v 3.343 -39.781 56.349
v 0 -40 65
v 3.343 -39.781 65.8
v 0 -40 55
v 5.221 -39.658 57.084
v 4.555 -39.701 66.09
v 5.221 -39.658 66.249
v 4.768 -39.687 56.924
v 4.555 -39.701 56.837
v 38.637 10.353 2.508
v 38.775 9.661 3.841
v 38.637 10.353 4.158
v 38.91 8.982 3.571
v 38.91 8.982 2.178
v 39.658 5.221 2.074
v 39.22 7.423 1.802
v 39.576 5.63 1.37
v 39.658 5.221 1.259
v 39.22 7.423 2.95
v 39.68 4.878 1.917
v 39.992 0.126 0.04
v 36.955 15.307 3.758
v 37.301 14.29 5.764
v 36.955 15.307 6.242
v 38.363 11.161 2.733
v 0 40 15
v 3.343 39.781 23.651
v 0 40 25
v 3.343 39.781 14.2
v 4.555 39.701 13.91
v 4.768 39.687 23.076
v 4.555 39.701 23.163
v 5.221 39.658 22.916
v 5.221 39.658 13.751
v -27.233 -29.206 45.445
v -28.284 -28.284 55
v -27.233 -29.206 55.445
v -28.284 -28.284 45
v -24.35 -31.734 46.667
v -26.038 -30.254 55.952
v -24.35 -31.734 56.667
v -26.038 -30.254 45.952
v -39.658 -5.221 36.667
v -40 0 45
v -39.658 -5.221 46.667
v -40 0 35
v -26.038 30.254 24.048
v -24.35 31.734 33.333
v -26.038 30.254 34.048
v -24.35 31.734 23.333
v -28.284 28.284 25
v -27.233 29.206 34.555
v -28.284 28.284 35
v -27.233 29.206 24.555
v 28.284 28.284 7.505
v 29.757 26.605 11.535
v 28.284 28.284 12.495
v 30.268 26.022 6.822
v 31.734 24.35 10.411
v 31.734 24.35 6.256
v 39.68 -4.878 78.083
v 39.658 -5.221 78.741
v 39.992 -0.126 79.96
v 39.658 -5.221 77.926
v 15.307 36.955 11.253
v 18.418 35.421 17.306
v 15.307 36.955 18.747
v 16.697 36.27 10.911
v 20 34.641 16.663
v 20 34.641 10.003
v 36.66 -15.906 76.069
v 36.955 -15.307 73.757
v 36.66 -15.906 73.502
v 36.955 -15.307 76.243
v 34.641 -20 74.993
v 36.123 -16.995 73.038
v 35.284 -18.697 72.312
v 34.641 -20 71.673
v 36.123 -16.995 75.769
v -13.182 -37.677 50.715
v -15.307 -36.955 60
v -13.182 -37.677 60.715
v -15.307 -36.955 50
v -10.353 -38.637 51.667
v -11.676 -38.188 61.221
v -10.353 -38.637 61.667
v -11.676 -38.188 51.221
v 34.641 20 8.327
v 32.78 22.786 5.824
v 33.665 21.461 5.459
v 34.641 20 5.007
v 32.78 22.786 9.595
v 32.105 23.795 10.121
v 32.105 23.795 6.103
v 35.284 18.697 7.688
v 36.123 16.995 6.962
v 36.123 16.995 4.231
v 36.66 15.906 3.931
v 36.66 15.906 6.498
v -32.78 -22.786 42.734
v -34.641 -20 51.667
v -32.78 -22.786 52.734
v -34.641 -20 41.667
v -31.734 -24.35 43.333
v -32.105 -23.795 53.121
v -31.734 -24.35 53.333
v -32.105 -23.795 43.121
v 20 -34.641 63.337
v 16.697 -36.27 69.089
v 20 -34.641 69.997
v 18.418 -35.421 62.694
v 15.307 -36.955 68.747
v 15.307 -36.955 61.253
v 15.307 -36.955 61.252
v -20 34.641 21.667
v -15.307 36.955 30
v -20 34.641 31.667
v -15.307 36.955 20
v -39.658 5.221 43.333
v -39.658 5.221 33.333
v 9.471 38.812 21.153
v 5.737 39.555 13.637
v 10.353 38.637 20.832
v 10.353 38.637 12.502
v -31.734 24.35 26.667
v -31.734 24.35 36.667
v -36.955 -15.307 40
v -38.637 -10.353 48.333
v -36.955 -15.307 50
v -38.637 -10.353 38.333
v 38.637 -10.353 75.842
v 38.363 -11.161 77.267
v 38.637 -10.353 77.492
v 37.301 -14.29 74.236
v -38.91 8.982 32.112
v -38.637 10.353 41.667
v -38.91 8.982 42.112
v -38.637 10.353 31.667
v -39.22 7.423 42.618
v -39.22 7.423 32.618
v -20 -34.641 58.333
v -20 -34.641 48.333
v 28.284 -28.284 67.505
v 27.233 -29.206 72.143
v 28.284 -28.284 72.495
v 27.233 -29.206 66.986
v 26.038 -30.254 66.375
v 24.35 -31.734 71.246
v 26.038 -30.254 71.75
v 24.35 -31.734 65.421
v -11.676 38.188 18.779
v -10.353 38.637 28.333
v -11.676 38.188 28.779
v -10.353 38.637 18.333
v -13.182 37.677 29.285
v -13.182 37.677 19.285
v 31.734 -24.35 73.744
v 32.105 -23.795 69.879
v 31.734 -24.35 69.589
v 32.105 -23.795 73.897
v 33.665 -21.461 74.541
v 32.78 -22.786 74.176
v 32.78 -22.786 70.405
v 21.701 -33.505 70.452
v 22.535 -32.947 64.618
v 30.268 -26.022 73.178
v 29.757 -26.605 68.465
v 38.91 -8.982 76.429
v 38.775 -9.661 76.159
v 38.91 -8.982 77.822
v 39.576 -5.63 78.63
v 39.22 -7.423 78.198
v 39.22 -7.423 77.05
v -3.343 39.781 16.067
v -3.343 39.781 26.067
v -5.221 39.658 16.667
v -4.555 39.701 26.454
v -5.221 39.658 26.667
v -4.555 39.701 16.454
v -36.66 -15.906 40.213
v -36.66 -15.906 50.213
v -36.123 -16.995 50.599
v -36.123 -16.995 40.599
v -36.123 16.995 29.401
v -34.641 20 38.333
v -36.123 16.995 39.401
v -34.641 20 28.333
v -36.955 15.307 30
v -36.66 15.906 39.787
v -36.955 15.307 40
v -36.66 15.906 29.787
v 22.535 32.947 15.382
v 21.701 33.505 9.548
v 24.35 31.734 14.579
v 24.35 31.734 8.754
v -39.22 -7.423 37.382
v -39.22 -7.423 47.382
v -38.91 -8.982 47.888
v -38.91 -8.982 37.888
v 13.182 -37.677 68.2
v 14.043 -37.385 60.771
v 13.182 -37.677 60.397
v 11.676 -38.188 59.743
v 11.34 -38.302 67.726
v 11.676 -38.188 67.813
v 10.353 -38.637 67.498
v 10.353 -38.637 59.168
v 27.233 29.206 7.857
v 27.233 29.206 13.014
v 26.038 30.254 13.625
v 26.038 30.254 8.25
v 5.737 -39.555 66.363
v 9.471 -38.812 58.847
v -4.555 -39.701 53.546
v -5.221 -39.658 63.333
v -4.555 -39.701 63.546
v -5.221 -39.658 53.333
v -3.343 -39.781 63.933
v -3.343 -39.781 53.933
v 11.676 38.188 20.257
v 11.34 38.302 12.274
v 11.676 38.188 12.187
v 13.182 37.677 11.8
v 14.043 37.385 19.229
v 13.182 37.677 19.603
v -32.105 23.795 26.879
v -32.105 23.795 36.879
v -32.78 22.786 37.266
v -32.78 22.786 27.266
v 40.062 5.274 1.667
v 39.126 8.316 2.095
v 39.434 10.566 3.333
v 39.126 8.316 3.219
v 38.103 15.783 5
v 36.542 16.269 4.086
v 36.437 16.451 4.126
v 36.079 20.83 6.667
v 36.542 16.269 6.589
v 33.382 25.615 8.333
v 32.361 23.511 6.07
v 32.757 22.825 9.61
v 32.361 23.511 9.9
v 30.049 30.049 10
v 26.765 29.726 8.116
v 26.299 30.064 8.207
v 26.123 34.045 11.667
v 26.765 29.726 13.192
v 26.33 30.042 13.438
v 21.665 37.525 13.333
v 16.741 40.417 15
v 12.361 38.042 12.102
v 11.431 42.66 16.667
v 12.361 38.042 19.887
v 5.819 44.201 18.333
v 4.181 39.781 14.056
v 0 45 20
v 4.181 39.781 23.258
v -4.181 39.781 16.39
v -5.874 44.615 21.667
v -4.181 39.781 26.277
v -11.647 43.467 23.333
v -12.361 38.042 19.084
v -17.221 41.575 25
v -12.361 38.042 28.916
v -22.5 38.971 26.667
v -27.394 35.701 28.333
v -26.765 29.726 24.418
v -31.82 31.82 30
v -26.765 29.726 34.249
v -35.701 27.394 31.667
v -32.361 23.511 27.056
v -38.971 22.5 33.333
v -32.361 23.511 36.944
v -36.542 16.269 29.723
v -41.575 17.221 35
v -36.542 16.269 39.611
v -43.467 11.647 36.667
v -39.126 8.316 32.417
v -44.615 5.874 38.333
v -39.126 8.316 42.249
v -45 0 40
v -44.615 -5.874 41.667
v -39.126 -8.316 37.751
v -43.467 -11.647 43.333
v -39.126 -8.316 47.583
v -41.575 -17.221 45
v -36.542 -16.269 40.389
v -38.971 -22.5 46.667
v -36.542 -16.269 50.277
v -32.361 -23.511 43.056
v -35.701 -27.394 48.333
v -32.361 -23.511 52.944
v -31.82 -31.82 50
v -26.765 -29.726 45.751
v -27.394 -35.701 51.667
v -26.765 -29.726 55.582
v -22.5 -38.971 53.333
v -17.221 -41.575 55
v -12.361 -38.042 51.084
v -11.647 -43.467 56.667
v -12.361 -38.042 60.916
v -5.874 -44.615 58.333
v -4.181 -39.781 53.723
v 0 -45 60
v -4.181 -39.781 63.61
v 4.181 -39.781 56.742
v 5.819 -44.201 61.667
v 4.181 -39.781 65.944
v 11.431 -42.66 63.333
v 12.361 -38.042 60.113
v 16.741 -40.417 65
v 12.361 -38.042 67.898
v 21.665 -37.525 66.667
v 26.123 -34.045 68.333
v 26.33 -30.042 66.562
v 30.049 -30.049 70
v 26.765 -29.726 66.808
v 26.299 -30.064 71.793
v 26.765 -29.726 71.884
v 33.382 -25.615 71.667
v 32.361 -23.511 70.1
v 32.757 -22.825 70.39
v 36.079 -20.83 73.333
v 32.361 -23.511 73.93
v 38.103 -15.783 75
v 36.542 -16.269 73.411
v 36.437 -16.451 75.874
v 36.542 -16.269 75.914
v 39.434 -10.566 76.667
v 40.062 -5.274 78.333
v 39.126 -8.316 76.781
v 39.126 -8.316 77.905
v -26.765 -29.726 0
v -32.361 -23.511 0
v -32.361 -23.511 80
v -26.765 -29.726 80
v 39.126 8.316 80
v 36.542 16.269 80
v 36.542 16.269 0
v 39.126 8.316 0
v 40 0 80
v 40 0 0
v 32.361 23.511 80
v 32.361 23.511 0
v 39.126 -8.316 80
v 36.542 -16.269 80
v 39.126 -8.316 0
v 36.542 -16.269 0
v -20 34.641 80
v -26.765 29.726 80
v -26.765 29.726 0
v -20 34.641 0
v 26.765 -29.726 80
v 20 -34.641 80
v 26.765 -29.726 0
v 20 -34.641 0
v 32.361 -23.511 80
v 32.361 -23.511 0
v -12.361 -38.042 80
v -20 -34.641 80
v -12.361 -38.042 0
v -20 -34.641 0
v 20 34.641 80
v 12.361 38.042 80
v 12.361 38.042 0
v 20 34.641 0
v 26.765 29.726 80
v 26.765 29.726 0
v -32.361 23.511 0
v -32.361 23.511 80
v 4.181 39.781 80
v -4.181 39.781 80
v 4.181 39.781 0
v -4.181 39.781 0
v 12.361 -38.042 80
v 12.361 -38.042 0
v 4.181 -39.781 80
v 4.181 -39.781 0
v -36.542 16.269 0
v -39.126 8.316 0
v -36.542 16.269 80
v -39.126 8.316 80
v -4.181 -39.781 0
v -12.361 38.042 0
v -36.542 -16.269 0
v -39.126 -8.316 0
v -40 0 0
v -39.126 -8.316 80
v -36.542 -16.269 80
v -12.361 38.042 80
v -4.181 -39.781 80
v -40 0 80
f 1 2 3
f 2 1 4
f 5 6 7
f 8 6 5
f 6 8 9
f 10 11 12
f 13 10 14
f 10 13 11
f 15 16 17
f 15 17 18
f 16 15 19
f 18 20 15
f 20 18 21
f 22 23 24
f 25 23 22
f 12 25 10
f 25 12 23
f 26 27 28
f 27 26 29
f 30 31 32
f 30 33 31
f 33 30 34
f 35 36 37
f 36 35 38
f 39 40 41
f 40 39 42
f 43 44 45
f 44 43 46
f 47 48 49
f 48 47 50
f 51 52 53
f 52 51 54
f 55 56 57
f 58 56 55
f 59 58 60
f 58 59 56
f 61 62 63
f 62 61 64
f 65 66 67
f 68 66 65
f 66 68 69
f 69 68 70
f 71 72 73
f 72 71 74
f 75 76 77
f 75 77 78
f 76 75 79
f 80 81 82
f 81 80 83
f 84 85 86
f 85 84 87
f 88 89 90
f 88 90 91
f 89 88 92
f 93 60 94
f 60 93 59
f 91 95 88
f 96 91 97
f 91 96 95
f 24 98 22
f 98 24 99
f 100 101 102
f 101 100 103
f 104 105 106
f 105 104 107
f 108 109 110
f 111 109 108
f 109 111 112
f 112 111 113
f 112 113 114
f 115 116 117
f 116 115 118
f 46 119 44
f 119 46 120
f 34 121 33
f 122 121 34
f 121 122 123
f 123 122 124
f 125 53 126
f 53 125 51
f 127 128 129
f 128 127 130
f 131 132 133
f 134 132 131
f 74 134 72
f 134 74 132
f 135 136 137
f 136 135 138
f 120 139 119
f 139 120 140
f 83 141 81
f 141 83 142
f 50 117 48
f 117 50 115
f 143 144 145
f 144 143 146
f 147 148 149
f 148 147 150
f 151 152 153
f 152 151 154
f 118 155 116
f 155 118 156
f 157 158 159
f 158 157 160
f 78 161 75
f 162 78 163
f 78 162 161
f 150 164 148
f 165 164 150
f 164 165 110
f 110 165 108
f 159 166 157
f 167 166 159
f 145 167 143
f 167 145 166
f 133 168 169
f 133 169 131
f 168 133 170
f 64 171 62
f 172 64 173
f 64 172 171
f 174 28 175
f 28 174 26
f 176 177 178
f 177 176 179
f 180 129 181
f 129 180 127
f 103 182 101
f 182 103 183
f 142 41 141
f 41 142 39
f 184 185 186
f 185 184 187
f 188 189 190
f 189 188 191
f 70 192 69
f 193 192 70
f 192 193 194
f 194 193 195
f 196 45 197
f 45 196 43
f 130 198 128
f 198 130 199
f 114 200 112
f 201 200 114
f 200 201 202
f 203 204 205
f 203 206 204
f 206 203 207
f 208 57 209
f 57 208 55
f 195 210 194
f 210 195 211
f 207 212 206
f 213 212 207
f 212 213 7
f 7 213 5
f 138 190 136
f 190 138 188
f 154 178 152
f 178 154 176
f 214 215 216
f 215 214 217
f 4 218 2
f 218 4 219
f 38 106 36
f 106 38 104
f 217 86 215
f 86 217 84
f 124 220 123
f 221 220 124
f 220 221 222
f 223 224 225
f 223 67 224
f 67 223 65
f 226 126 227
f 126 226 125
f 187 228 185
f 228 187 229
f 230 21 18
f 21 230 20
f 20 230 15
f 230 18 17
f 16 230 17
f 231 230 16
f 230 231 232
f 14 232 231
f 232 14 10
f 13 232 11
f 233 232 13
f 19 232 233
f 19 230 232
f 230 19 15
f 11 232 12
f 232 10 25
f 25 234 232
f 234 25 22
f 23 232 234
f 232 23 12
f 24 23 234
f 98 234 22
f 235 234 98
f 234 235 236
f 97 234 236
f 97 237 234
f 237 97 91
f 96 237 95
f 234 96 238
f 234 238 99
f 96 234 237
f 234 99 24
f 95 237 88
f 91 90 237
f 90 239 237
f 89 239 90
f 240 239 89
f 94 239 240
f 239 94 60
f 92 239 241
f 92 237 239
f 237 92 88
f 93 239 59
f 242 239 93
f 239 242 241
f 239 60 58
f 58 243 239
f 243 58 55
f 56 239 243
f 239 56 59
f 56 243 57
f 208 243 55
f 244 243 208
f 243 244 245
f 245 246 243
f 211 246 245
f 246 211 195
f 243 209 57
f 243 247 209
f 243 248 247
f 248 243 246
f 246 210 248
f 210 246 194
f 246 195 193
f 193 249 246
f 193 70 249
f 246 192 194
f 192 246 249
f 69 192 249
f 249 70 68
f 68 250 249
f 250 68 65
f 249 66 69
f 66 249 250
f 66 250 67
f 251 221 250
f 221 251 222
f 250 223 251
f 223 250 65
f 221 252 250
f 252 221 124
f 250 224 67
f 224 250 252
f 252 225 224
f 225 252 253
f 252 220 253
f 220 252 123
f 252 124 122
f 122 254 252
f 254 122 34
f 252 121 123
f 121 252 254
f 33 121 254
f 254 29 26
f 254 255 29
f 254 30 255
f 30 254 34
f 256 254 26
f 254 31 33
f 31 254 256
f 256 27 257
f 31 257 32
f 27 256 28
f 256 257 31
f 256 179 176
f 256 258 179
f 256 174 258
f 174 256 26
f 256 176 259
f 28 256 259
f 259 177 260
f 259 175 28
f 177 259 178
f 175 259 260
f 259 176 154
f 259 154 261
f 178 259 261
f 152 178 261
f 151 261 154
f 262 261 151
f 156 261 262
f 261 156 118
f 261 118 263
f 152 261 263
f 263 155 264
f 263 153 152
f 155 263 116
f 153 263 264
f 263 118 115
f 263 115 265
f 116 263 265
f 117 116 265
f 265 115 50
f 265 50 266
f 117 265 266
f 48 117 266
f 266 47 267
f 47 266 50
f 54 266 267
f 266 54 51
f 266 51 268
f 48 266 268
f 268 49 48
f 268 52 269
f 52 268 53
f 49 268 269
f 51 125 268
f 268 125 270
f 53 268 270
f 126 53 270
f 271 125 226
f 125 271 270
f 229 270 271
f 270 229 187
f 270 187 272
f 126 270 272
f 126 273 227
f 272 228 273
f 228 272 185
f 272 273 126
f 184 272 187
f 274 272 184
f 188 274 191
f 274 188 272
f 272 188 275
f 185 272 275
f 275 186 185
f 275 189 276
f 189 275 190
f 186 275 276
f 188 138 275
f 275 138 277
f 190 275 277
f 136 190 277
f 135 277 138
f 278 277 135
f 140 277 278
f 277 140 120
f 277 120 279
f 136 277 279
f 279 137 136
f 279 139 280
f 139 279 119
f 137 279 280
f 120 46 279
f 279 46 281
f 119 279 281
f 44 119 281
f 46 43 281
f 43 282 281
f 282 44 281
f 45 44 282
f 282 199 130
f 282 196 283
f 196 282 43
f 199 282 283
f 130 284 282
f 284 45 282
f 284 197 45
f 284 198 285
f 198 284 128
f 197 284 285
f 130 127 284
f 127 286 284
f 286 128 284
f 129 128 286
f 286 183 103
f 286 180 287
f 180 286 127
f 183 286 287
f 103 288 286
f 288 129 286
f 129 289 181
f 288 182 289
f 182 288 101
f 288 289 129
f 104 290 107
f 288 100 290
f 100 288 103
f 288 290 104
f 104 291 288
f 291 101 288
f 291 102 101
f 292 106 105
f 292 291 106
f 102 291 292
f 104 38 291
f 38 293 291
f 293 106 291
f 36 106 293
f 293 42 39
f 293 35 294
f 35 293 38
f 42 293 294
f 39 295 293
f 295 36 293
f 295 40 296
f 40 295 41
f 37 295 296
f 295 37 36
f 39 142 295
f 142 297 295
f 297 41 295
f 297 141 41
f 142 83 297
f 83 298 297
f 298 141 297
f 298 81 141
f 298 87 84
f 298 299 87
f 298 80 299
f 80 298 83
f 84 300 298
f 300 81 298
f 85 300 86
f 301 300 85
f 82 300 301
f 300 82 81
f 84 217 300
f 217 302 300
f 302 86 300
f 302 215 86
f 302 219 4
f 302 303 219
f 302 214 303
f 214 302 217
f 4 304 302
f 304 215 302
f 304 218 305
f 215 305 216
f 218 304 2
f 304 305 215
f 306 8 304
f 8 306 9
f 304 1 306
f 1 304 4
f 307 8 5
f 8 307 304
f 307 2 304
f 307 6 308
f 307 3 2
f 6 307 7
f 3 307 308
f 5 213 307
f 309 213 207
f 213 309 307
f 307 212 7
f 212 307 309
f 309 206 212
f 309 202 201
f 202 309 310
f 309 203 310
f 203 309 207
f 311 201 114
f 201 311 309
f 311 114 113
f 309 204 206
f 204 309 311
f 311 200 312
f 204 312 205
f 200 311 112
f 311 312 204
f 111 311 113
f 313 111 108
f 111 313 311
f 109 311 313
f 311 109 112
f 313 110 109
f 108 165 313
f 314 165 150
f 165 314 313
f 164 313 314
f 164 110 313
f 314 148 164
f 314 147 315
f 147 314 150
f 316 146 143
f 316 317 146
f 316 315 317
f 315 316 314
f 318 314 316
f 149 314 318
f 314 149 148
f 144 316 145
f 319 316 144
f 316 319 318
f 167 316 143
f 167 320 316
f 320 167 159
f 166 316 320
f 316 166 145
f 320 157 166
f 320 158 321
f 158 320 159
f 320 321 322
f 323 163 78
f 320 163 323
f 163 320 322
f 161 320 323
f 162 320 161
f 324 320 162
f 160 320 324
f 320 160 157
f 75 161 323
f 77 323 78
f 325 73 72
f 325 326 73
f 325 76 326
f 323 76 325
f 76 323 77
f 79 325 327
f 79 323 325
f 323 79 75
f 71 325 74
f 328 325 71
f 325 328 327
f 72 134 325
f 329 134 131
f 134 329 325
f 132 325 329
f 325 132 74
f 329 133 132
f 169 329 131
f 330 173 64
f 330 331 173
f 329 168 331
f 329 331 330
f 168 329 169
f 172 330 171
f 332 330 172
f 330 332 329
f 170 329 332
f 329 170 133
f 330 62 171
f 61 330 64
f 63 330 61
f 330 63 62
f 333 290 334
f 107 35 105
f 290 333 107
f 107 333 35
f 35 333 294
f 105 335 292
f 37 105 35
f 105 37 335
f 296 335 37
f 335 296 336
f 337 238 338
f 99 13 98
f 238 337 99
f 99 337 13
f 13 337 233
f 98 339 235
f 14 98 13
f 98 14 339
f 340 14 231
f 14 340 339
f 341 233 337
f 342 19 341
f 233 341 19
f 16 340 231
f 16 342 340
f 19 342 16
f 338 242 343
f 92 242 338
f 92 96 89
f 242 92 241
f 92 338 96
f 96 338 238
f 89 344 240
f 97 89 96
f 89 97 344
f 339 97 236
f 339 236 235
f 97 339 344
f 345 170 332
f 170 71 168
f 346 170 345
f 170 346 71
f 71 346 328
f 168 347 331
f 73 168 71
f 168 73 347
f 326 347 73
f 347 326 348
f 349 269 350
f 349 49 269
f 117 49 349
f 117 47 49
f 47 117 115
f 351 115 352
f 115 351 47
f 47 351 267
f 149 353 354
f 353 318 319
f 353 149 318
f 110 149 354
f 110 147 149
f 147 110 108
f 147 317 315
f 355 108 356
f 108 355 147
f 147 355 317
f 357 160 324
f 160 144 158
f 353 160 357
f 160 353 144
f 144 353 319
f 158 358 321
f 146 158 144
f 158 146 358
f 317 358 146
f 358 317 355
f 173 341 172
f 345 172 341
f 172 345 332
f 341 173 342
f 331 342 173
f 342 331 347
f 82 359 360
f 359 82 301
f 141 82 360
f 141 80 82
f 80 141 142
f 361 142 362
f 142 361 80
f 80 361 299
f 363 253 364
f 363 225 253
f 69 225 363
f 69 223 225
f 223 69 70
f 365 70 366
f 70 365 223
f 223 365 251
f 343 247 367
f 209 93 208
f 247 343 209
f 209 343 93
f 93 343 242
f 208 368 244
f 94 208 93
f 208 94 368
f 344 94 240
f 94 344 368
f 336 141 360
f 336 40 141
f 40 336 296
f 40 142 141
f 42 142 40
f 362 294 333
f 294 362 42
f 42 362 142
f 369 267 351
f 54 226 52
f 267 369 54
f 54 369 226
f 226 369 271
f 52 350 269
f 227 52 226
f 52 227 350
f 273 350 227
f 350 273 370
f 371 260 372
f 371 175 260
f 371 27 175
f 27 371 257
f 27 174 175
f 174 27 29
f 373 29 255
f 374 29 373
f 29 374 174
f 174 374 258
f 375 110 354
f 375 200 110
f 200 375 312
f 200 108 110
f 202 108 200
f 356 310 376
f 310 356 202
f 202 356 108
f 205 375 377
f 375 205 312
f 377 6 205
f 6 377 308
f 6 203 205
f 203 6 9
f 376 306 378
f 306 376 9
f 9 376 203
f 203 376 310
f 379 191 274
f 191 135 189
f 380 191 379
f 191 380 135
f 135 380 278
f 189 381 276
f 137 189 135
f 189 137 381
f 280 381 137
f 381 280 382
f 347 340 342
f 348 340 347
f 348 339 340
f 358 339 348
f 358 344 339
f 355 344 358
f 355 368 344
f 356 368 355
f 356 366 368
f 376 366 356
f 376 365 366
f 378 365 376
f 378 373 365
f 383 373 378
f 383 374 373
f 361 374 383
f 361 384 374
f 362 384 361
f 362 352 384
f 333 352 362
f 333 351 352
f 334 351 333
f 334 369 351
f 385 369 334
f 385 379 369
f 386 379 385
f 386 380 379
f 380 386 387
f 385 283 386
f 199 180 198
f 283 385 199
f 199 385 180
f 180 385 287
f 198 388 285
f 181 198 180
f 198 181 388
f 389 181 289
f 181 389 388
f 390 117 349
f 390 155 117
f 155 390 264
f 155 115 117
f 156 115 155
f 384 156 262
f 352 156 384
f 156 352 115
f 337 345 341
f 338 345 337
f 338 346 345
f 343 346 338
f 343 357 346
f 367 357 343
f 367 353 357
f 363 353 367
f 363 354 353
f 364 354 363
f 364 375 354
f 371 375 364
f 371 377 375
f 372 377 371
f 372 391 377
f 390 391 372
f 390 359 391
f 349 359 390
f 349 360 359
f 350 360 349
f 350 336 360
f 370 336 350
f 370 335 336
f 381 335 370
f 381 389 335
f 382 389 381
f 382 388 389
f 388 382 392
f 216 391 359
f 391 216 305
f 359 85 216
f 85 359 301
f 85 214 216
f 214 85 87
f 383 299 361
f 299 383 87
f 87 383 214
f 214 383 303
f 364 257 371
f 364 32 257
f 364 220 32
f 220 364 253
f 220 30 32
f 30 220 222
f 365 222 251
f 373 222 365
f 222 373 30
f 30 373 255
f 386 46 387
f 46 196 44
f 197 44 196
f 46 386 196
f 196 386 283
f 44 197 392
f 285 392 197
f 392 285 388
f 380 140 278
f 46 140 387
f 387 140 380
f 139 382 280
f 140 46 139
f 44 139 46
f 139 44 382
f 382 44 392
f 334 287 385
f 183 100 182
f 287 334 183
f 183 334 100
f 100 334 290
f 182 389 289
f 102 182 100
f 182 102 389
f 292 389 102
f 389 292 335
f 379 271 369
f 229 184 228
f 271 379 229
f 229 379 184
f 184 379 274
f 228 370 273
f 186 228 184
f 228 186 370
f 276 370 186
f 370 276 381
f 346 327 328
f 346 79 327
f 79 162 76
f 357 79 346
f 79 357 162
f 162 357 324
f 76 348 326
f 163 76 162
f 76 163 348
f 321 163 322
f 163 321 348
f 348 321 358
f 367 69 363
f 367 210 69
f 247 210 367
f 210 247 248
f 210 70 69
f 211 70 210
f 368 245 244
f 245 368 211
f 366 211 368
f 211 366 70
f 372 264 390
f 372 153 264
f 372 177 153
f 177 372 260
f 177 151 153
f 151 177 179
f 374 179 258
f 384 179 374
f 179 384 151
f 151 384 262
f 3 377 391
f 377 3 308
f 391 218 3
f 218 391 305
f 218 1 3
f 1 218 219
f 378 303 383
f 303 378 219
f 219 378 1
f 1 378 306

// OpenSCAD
// Generated by SolidPython 1.0.5 on 2021-06-01 16:29:01


union() {
	intersection() {
		polyhedron(convexity = 2, faces = [[0, 1, 3], [1, 4, 3], [1, 2, 4], [2, 5, 4], [0, 5, 2], [0, 3, 5], [3, 4, 6], [4, 7, 6], [4, 5, 7], [5, 8, 7], [3, 8, 5], [3, 6, 8], [6, 7, 9], [7, 10, 9], [7, 8, 10], [8, 11, 10], [6, 11, 8], [6, 9, 11], [9, 10, 12], [10, 13, 12], [10, 11, 13], [11, 14, 13], [9, 14, 11], [9, 12, 14], [12, 13, 15], [13, 16, 15], [13, 14, 16], [14, 17, 16], [12, 17, 14], [12, 15, 17], [15, 16, 18], [16, 19, 18], [16, 17, 19], [17, 20, 19], [15, 20, 17], [15, 18, 20], [18, 19, 21], [19, 22, 21], [19, 20, 22], [20, 23, 22], [18, 23, 20], [18, 21, 23], [21, 22, 24], [22, 25, 24], [22, 23, 25], [23, 26, 25], [21, 26, 23], [21, 24, 26], [24, 25, 27], [25, 28, 27], [25, 26, 28], [26, 29, 28], [24, 29, 26], [24, 27, 29], [27, 28, 30], [28, 31, 30], [28, 29, 31], [29, 32, 31], [27, 32, 29], [27, 30, 32], [30, 31, 33], [31, 34, 33], [31, 32, 34], [32, 35, 34], [30, 35, 32], [30, 33, 35], [33, 34, 36], [34, 37, 36], [34, 35, 37], [35, 38, 37], [33, 38, 35], [33, 36, 38], [36, 37, 39], [37, 40, 39], [37, 38, 40], [38, 41, 40], [36, 41, 38], [36, 39, 41], [39, 40, 42], [40, 43, 42], [40, 41, 43], [41, 44, 43], [39, 44, 41], [39, 42, 44], [42, 43, 45], [43, 46, 45], [43, 44, 46], [44, 47, 46], [42, 47, 44], [42, 45, 47], [45, 46, 48], [46, 49, 48], [46, 47, 49], [47, 50, 49], [45, 50, 47], [45, 48, 50], [48, 49, 51], [49, 52, 51], [49, 50, 52], [50, 53, 52], [48, 53, 50], [48, 51, 53], [51, 52, 54], [52, 55, 54], [52, 53, 55], [53, 56, 55], [51, 56, 53], [51, 54, 56], [54, 55, 57], [55, 58, 57], [55, 56, 58], [56, 59, 58], [54, 59, 56], [54, 57, 59], [57, 58, 60], [58, 61, 60], [58, 59, 61], [59, 62, 61], [57, 62, 59], [57, 60, 62], [60, 61, 63], [61, 64, 63], [61, 62, 64], [62, 65, 64], [60, 65, 62], [60, 63, 65], [63, 64, 66], [64, 67, 66], [64, 65, 67], [65, 68, 67], [63, 68, 65], [63, 66, 68], [66, 67, 69], [67, 70, 69], [67, 68, 70], [68, 71, 70], [66, 71, 68], [66, 69, 71], [69, 70, 72], [70, 73, 72], [70, 71, 73], [71, 74, 73], [69, 74, 71], [69, 72, 74], [72, 73, 75], [73, 76, 75], [73, 74, 76], [74, 77, 76], [72, 77, 74], [72, 75, 77], [75, 76, 78], [76, 79, 78], [76, 77, 79], [77, 80, 79], [75, 80, 77], [75, 78, 80], [78, 79, 81], [79, 82, 81], [79, 80, 82], [80, 83, 82], [78, 83, 80], [78, 81, 83], [81, 82, 84], [82, 85, 84], [82, 83, 85], [83, 86, 85], [81, 86, 83], [81, 84, 86], [84, 85, 87], [85, 88, 87], [85, 86, 88], [86, 89, 88], [84, 89, 86], [84, 87, 89], [87, 88, 90], [88, 91, 90], [88, 89, 91], [89, 92, 91], [87, 92, 89], [87, 90, 92], [90, 91, 93], [91, 94, 93], [91, 92, 94], [92, 95, 94], [90, 95, 92], [90, 93, 95], [93, 94, 96], [94, 97, 96], [94, 95, 97], [95, 98, 97], [93, 98, 95], [93, 96, 98], [96, 97, 99], [97, 100, 99], [97, 98, 100], [98, 101, 100], [96, 101, 98], [96, 99, 101], [99, 100, 102], [100, 103, 102], [100, 101, 103], [101, 104, 103], [99, 104, 101], [99, 102, 104], [102, 103, 105], [103, 106, 105], [103, 104, 106], [104, 107, 106], [102, 107, 104], [102, 105, 107], [105, 106, 108], [106, 109, 108], [106, 107, 109], [107, 110, 109], [105, 110, 107], [105, 108, 110], [108, 109, 111], [109, 112, 111], [109, 110, 112], [110, 113, 112], [108, 113, 110], [108, 111, 113], [111, 112, 114], [112, 115, 114], [112, 113, 115], [113, 116, 115], [111, 116, 113], [111, 114, 116], [114, 115, 117], [115, 118, 117], [115, 116, 118], [116, 119, 118], [114, 119, 116], [114, 117, 119], [117, 118, 120], [118, 121, 120], [118, 119, 121], [119, 122, 121], [117, 122, 119], [117, 120, 122], [120, 121, 123], [121, 124, 123], [121, 122, 124], [122, 125, 124], [120, 125, 122], [120, 123, 125], [123, 124, 126], [124, 127, 126], [124, 125, 127], [125, 128, 127], [123, 128, 125], [123, 126, 128], [126, 127, 129], [127, 130, 129], [127, 128, 130], [128, 131, 130], [126, 131, 128], [126, 129, 131], [129, 130, 132], [130, 133, 132], [130, 131, 133], [131, 134, 133], [129, 134, 131], [129, 132, 134], [132, 133, 135], [133, 136, 135], [133, 134, 136], [134, 137, 136], [132, 137, 134], [132, 135, 137], [135, 136, 138], [136, 139, 138], [136, 137, 139], [137, 140, 139], [135, 140, 137], [135, 138, 140], [138, 139, 141], [139, 142, 141], [139, 140, 142], [140, 143, 142], [138, 143, 140], [138, 141, 143], [141, 142, 144], [142, 145, 144], [142, 143, 145], [143, 146, 145], [141, 146, 143], [141, 144, 146], [0, 2, 1], [144, 145, 146]], points = [[34.9900000000, 0.0000000000, -5.0000000000], [39.9900000000, 0.0000000000, 0.0000000000], [34.9900000000, 0.0000000000, 5.0000000000], [35.1045839291, 4.6216061510, -3.3333333333], [40.0618082360, 5.2742371121, 1.6666666667], [35.1045839291, 4.6216061510, 6.6666666667], [34.6042927268, 9.2721922908, -1.6666666667], [39.4339218583, 10.5662875163, 3.3333333333], [34.6042927268, 9.2721922908, 8.3333333333], [33.4837039570, 13.8694042975, 0.0000000000], [38.1031016196, 15.7828214593, 5.0000000000], [33.4837039570, 13.8694042975, 10.0000000000], [31.7484913027, 18.3300000000, 1.6666666667], [36.0786183217, 20.8300000000, 6.6666666667], [31.7484913027, 18.3300000000, 11.6666666667], [29.4155584746, 22.5713518841, 3.3333333333], [33.3823251761, 25.6151590291, 8.3333333333], [29.4155584746, 22.5713518841, 13.3333333333], [26.5129687606, 26.5129687606, 5.0000000000], [30.0485026665, 30.0485026665, 10.0000000000], [26.5129687606, 26.5129687606, 15.0000000000], [23.0796676773, 30.0780085138, 6.6666666667], [26.1234748223, 34.0447752152, 11.6666666667], [23.0796676773, 30.0780085138, 16.6666666667], [19.1650000000, 33.1947537271, 8.3333333333], [21.6650000000, 37.5248807460, 13.3333333333], [19.1650000000, 33.1947537271, 18.3333333333], [14.8280262956, 35.7980221860, 10.0000000000], [16.7414434574, 40.4174198485, 15.0000000000], [14.8280262956, 35.7980221860, 20.0000000000], [10.1366479014, 37.8304849866, 11.6666666667], [11.4307431270, 42.6601141181, 16.6666666667], [10.1366479014, 37.8304849866, 21.6666666667], [5.1665530036, 39.2438662253, 13.3333333333], [5.8191839647, 44.2010905322, 18.3333333333], [5.1665530036, 39.2438662253, 23.3333333333], [0.0000000000, 40.0000000000, 15.0000000000], [0.0000000000, 45.0000000000, 20.0000000000], [0.0000000000, 40.0000000000, 25.0000000000], [-5.2210476888, 39.6577944550, 16.6666666667], [-5.8736786499, 44.6150187618, 21.6666666667], [-5.2210476888, 39.6577944550, 26.6666666667], [-10.3527618041, 38.6370330516, 18.3333333333], [-11.6468570296, 43.4666621830, 23.3333333333], [-10.3527618041, 38.6370330516, 28.3333333333], [-15.3073372946, 36.9551813005, 20.0000000000], [-17.2207544564, 41.5745789630, 25.0000000000], [-15.3073372946, 36.9551813005, 30.0000000000], [-20.0000000000, 34.6410161514, 21.6666666667], [-22.5000000000, 38.9711431703, 26.6666666667], [-20.0000000000, 34.6410161514, 31.6666666667], [-24.3504571603, 31.7341336116, 23.3333333333], [-27.3942643054, 35.7009003131, 28.3333333333], [-24.3504571603, 31.7341336116, 33.3333333333], [-28.2842712475, 28.2842712475, 25.0000000000], [-31.8198051534, 31.8198051534, 30.0000000000], [-28.2842712475, 28.2842712475, 35.0000000000], [-31.7341336116, 24.3504571603, 26.6666666667], [-35.7009003131, 27.3942643054, 31.6666666667], [-31.7341336116, 24.3504571603, 36.6666666667], [-34.6410161514, 20.0000000000, 28.3333333333], [-38.9711431703, 22.5000000000, 33.3333333333], [-34.6410161514, 20.0000000000, 38.3333333333], [-36.9551813005, 15.3073372946, 30.0000000000], [-41.5745789630, 17.2207544564, 35.0000000000], [-36.9551813005, 15.3073372946, 40.0000000000], [-38.6370330516, 10.3527618041, 31.6666666667], [-43.4666621830, 11.6468570296, 36.6666666667], [-38.6370330516, 10.3527618041, 41.6666666667], [-39.6577944550, 5.2210476888, 33.3333333333], [-44.6150187618, 5.8736786499, 38.3333333333], [-39.6577944550, 5.2210476888, 43.3333333333], [-40.0000000000, 0.0000000000, 35.0000000000], [-45.0000000000, 0.0000000000, 40.0000000000], [-40.0000000000, 0.0000000000, 45.0000000000], [-39.6577944550, -5.2210476888, 36.6666666667], [-44.6150187618, -5.8736786499, 41.6666666667], [-39.6577944550, -5.2210476888, 46.6666666667], [-38.6370330516, -10.3527618041, 38.3333333333], [-43.4666621830, -11.6468570296, 43.3333333333], [-38.6370330516, -10.3527618041, 48.3333333333], [-36.9551813005, -15.3073372946, 40.0000000000], [-41.5745789630, -17.2207544564, 45.0000000000], [-36.9551813005, -15.3073372946, 50.0000000000], [-34.6410161514, -20.0000000000, 41.6666666667], [-38.9711431703, -22.5000000000, 46.6666666667], [-34.6410161514, -20.0000000000, 51.6666666667], [-31.7341336116, -24.3504571603, 43.3333333333], [-35.7009003131, -27.3942643054, 48.3333333333], [-31.7341336116, -24.3504571603, 53.3333333333], [-28.2842712475, -28.2842712475, 45.0000000000], [-31.8198051534, -31.8198051534, 50.0000000000], [-28.2842712475, -28.2842712475, 55.0000000000], [-24.3504571603, -31.7341336116, 46.6666666667], [-27.3942643054, -35.7009003131, 51.6666666667], [-24.3504571603, -31.7341336116, 56.6666666667], [-20.0000000000, -34.6410161514, 48.3333333333], [-22.5000000000, -38.9711431703, 53.3333333333], [-20.0000000000, -34.6410161514, 58.3333333333], [-15.3073372946, -36.9551813005, 50.0000000000], [-17.2207544564, -41.5745789630, 55.0000000000], [-15.3073372946, -36.9551813005, 60.0000000000], [-10.3527618041, -38.6370330516, 51.6666666667], [-11.6468570296, -43.4666621830, 56.6666666667], [-10.3527618041, -38.6370330516, 61.6666666667], [-5.2210476888, -39.6577944550, 53.3333333333], [-5.8736786499, -44.6150187618, 58.3333333333], [-5.2210476888, -39.6577944550, 63.3333333333], [-0.0000000000, -40.0000000000, 55.0000000000], [-0.0000000000, -45.0000000000, 60.0000000000], [-0.0000000000, -40.0000000000, 65.0000000000], [5.1665530036, -39.2438662253, 56.6666666667], [5.8191839647, -44.2010905322, 61.6666666667], [5.1665530036, -39.2438662253, 66.6666666667], [10.1366479014, -37.8304849866, 58.3333333333], [11.4307431270, -42.6601141181, 63.3333333333], [10.1366479014, -37.8304849866, 68.3333333333], [14.8280262956, -35.7980221860, 60.0000000000], [16.7414434574, -40.4174198485, 65.0000000000], [14.8280262956, -35.7980221860, 70.0000000000], [19.1650000000, -33.1947537271, 61.6666666667], [21.6650000000, -37.5248807460, 66.6666666667], [19.1650000000, -33.1947537271, 71.6666666667], [23.0796676773, -30.0780085138, 63.3333333333], [26.1234748223, -34.0447752152, 68.3333333333], [23.0796676773, -30.0780085138, 73.3333333333], [26.5129687606, -26.5129687606, 65.0000000000], [30.0485026665, -30.0485026665, 70.0000000000], [26.5129687606, -26.5129687606, 75.0000000000], [29.4155584746, -22.5713518841, 66.6666666667], [33.3823251761, -25.6151590291, 71.6666666667], [29.4155584746, -22.5713518841, 76.6666666667], [31.7484913027, -18.3300000000, 68.3333333333], [36.0786183217, -20.8300000000, 73.3333333333], [31.7484913027, -18.3300000000, 78.3333333333], [33.4837039570, -13.8694042975, 70.0000000000], [38.1031016196, -15.7828214593, 75.0000000000], [33.4837039570, -13.8694042975, 80.0000000000], [34.6042927268, -9.2721922908, 71.6666666667], [39.4339218583, -10.5662875163, 76.6666666667], [34.6042927268, -9.2721922908, 81.6666666667], [35.1045839291, -4.6216061510, 73.3333333333], [40.0618082360, -5.2742371121, 78.3333333333], [35.1045839291, -4.6216061510, 83.3333333333], [34.9900000000, -0.0000000000, 75.0000000000], [39.9900000000, -0.0000000000, 80.0000000000], [34.9900000000, -0.0000000000, 85.0000000000]]);
		difference() {
			cylinder($fn = 48, h = 80, r1 = 45.0100000000, r2 = 45.0100000000);
			cylinder($fn = 48, h = 80, r1 = 40, r2 = 40);
		}
	}
	cylinder(h = 80, r = 40);
}
/***********************************************
*********      SolidPython code:      **********
************************************************
 
#! /usr/bin/env python3
import sys

from solid import scad_render_to_file
from solid import screw_thread
from solid.objects import cylinder

SEGMENTS = 48

inner_rad = 40
screw_height = 80


def assembly():
    section = screw_thread.default_thread_section(tooth_height=10, tooth_depth=5)
    s = screw_thread.thread(outline_pts=section,
                            inner_rad=inner_rad,
                            pitch=screw_height,
                            length=screw_height,
                            segments_per_rot=SEGMENTS,
                            neck_in_degrees=90,
                            neck_out_degrees=90)

    c = cylinder(r=inner_rad, h=screw_height)
    return s + c


if __name__ == '__main__':
    out_dir = sys.argv[1] if len(sys.argv) > 1 else None
    a = assembly()
    file_out = scad_render_to_file(a, out_dir=out_dir, include_orig_code=True)
    print(f"{__file__}: SCAD file written to: \n{file_out}")
 
 
************************************************/
